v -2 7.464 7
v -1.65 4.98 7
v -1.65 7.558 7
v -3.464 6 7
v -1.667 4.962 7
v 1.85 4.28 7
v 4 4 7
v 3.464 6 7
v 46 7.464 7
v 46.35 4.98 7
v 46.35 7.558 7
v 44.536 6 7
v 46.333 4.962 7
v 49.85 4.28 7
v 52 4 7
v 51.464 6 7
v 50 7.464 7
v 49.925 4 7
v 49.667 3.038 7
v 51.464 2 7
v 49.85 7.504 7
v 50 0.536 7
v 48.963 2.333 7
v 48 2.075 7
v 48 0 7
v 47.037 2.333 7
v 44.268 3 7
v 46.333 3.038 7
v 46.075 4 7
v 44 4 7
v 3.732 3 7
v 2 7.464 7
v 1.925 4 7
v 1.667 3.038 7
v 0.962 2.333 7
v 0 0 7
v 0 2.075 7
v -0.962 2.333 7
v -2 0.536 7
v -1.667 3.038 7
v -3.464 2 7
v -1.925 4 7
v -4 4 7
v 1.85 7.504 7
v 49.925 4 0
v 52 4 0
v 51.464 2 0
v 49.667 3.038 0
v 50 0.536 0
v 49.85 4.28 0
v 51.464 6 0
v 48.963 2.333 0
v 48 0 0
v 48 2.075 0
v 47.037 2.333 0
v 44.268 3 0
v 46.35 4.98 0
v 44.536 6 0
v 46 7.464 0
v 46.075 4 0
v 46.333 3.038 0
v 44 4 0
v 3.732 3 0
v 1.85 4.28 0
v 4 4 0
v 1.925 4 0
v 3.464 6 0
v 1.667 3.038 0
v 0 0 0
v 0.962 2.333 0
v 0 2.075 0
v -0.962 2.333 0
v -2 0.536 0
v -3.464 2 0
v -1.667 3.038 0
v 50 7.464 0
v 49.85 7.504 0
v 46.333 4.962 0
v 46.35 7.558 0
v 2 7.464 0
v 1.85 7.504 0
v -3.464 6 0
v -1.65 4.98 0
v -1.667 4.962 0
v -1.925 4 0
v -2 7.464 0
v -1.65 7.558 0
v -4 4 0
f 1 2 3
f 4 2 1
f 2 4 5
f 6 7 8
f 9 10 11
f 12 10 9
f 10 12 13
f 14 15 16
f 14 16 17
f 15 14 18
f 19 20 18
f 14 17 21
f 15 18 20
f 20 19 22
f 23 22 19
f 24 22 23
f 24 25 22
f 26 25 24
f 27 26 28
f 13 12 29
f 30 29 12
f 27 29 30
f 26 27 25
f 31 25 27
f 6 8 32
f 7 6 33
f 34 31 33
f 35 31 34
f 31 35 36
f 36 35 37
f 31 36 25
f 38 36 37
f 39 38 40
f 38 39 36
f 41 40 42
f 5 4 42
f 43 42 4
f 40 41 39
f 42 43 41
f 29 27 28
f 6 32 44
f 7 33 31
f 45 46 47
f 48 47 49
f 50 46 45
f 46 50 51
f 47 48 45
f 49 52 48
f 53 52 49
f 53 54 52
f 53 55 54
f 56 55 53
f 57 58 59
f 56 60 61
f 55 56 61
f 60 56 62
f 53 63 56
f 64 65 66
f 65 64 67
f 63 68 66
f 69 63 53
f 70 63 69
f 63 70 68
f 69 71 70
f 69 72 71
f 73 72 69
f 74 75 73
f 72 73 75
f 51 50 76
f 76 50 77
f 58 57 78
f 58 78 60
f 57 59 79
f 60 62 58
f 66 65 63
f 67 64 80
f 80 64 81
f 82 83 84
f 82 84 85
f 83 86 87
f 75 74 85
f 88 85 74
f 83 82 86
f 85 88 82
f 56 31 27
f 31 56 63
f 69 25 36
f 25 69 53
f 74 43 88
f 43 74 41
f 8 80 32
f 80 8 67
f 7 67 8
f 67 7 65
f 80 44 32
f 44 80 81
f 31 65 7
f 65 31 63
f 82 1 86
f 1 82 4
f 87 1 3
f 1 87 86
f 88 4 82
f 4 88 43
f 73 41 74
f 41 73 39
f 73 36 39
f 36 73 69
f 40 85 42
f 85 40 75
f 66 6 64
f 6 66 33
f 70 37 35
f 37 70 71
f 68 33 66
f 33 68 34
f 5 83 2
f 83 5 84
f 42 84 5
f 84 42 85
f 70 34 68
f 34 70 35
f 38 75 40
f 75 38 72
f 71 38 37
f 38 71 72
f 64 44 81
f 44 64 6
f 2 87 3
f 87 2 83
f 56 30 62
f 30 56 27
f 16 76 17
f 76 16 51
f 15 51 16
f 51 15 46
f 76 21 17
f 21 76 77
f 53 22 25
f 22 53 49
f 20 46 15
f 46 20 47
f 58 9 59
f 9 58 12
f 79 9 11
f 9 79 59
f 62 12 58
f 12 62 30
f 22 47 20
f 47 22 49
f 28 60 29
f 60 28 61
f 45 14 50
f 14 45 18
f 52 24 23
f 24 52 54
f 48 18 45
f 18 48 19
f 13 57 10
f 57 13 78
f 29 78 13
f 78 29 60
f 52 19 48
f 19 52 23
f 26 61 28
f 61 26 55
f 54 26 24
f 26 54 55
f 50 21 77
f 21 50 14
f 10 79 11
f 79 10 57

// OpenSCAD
handyman();

module grasper(height, outerradius, innerradius)
{
	slotsize = 3.3;
	slotoffset = 0;

	difference()
	{
		cylinder(h=height, r=outerradius, $fn = 12);

		// Subtract inner cylinder
		cylinder(h=height+0.5, r=innerradius, $fn =12);

		// Subtract slot
		translate([-slotsize/2,slotoffset,-0.25]) color([1,0,0]) 
			cube(size=[3.5, innerradius*2+0.5, height+0.5]);
	}
}

module handyman()
{
	armlength = 48;
	outerradius = 8/2;
	innerradius = 3.85/2;
	height = 7;
	thickness = 3;

	union()
	{
		difference()
		{
			// The backbone
			translate([0,0,0]) cube(size=[armlength, thickness, height]);
				

			// Remove some curves so graspers can be cleanly attached
			translate([0,outerradius,-0.25]) cylinder(h= height +0.5, r = outerradius-0.25);
	
			translate([armlength, outerradius, 0]) cylinder(h=height+0.5, r=outerradius-0.25);
		}
	
		// The grasping connectors
		translate([0, outerradius, 0])
			grasper(7, outerradius, innerradius);
	
		translate([armlength, outerradius, 0])
			grasper(7,outerradius, innerradius);
	}

}
